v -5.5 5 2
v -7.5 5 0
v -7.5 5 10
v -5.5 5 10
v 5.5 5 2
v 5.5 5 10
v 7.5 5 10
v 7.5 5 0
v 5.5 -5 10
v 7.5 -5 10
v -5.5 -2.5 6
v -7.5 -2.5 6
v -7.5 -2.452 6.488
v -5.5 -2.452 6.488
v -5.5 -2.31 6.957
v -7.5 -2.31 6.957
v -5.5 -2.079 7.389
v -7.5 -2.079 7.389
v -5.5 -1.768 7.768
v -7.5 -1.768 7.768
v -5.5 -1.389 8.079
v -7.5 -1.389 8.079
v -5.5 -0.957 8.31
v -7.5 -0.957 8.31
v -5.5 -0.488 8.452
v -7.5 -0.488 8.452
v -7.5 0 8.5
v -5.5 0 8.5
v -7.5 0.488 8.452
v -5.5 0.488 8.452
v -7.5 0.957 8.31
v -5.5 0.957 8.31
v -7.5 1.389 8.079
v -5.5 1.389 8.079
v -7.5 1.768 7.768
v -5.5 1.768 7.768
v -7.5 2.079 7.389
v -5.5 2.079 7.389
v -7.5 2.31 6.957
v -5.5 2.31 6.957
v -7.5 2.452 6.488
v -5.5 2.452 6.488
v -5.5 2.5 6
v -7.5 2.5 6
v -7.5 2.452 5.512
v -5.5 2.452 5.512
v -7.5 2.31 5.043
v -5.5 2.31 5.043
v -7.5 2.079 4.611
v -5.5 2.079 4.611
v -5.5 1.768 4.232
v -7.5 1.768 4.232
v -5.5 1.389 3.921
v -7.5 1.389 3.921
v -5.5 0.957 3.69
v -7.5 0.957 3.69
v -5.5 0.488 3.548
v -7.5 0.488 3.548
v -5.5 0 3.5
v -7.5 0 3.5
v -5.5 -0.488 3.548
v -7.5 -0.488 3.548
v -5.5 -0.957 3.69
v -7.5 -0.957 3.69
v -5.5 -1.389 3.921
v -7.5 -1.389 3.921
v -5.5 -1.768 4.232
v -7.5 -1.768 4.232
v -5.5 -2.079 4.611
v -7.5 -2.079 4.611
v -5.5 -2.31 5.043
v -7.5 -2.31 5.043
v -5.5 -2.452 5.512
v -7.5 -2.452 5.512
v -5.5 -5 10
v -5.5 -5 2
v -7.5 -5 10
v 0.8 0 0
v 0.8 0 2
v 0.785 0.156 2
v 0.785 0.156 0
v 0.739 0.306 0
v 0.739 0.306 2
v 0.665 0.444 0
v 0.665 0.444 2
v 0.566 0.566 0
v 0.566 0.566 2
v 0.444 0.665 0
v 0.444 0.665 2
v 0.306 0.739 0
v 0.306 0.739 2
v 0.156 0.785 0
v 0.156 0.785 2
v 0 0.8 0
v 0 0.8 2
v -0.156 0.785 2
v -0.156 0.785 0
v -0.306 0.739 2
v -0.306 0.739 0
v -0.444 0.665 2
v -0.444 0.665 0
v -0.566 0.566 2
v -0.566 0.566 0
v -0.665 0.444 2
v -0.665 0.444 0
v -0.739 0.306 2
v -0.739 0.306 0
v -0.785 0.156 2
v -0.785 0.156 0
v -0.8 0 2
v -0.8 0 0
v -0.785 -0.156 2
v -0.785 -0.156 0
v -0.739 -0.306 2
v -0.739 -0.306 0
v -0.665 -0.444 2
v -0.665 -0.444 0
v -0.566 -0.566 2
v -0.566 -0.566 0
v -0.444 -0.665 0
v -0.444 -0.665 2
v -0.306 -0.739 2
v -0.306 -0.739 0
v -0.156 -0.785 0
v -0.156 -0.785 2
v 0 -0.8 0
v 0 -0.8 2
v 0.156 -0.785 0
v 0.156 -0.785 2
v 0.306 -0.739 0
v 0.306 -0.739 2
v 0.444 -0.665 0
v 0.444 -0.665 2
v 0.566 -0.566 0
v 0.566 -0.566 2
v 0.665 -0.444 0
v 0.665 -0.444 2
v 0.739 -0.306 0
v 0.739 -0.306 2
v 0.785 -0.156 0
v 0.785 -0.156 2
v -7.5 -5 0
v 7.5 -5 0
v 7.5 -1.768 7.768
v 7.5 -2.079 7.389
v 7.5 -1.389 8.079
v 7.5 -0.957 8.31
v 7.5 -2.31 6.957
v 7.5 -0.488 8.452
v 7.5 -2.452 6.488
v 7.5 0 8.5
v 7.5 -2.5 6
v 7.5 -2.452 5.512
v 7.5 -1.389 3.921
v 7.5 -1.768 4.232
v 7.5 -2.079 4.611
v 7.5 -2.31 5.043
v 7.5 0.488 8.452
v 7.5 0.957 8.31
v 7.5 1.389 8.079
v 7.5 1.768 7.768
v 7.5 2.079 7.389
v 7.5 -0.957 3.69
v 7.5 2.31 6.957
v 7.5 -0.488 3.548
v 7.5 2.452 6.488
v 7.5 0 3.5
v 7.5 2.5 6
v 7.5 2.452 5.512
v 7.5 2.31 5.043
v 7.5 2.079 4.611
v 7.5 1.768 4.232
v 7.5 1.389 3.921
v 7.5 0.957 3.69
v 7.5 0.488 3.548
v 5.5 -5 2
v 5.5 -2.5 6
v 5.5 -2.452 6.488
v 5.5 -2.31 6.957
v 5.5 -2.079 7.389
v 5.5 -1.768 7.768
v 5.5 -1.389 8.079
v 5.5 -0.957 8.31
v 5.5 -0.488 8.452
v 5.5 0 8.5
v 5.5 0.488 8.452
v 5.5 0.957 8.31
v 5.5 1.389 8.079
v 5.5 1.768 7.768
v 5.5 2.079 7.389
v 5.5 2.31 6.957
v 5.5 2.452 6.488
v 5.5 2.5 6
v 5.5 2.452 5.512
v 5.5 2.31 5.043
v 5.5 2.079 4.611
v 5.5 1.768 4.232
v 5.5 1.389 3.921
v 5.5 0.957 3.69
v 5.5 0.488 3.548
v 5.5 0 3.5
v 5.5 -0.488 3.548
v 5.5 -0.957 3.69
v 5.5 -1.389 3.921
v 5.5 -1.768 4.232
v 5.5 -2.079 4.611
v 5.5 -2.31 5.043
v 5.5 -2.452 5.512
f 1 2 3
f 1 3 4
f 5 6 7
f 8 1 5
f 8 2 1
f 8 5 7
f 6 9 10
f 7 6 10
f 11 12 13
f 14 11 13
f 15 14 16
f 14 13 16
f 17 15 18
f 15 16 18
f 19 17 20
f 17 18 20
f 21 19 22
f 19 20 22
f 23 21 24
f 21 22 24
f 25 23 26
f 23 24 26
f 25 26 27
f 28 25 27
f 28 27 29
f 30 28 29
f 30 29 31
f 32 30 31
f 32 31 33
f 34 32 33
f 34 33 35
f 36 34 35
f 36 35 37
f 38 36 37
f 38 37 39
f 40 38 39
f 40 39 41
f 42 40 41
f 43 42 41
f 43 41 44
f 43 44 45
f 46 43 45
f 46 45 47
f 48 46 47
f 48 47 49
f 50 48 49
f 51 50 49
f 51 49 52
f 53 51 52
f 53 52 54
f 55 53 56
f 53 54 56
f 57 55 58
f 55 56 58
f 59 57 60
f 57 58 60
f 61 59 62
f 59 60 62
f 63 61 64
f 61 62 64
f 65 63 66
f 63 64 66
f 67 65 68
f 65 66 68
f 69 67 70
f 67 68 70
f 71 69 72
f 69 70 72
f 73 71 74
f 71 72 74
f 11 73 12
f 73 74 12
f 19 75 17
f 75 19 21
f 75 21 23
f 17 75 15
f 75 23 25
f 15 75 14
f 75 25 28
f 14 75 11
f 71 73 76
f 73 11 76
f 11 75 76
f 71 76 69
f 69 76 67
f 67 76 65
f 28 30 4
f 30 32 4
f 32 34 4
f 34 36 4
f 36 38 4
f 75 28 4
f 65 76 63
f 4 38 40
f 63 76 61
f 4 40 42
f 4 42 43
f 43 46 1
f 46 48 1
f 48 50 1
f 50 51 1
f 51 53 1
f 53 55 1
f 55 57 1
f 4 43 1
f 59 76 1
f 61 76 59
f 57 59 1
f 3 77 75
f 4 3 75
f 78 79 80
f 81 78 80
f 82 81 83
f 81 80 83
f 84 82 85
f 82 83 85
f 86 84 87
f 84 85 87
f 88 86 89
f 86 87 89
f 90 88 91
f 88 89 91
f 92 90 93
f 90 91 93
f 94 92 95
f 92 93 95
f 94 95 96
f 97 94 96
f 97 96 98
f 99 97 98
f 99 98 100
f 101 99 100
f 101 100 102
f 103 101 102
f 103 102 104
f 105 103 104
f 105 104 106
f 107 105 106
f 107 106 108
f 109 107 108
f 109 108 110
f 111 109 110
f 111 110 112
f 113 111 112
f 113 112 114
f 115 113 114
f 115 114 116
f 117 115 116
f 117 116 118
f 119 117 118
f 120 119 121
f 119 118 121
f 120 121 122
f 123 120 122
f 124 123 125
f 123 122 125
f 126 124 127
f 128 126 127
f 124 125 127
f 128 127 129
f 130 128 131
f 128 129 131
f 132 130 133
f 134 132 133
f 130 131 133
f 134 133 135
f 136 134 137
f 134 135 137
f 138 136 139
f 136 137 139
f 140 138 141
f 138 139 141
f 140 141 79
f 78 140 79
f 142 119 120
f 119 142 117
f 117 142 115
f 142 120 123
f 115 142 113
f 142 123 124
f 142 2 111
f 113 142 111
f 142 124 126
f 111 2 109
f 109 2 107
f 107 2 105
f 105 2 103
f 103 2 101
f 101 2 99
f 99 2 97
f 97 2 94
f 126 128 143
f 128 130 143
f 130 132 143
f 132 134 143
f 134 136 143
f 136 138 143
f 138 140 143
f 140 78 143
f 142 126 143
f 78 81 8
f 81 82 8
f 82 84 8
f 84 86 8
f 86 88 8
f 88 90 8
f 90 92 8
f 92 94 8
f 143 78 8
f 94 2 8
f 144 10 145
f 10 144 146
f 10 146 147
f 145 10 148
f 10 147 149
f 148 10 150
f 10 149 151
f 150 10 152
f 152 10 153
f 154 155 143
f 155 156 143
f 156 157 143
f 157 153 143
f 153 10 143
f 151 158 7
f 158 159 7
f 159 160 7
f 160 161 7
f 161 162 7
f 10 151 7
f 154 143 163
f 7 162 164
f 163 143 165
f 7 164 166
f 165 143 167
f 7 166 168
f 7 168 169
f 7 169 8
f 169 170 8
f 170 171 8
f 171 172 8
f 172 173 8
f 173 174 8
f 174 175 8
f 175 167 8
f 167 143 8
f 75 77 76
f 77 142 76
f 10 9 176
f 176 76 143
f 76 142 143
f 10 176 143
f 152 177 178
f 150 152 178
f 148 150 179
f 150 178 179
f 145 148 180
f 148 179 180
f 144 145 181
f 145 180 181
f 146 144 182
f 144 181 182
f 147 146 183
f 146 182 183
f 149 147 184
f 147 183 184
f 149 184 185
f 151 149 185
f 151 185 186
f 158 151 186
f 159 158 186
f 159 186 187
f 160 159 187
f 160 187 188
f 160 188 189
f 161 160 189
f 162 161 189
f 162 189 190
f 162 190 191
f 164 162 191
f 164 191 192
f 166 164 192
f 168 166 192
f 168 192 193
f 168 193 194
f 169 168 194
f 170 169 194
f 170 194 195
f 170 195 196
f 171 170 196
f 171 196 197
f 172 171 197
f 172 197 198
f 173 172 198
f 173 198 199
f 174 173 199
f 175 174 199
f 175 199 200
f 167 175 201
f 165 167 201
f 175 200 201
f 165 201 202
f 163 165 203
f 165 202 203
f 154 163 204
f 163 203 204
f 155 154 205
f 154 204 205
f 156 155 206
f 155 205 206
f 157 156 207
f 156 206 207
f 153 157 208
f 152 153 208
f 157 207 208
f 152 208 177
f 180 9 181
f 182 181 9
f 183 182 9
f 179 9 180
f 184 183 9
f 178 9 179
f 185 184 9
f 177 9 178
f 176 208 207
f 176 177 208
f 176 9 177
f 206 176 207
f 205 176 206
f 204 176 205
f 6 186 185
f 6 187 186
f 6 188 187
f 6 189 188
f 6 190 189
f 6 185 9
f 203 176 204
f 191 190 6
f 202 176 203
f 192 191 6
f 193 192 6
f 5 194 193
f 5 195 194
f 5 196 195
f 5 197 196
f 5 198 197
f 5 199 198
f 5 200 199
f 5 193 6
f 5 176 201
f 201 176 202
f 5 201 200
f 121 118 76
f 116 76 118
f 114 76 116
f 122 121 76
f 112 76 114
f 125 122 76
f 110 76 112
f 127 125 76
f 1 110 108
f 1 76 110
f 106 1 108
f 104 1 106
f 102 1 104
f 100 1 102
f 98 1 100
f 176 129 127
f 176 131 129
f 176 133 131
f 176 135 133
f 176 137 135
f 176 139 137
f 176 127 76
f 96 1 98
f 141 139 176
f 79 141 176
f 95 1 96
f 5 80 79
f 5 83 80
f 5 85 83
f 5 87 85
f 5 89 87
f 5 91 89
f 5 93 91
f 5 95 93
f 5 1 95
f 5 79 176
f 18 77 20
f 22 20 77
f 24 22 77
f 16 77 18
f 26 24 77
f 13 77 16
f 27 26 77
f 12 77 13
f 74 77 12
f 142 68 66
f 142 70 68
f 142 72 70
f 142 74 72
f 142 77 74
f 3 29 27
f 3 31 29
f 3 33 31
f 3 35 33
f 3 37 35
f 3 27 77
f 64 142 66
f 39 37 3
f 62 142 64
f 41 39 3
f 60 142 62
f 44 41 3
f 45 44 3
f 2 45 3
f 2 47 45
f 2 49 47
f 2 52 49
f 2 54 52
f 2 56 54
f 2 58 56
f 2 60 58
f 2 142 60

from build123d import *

# Parameters (mm, degrees)
SKETCH1_W           = 15
SKETCH1_H           = 10
BOSS_EXTRUDE1_DEPTH = 2
SKETCH2_W           = 2
SKETCH2_H           = 10
BOSS_EXTRUDE2_DEPTH = 8
SKETCH3_R           = 2.5
CUT_EXTRUDE1_DEPTH  = 19.708286934
SKETCH4_R           = 0.8
CUT_EXTRUDE2_DEPTH  = 13.051970793


with BuildPart() as part:
    # Sketch1 → Boss-Extrude1 (new body)
    with BuildSketch(Plane.XY):
        Rectangle(SKETCH1_W, SKETCH1_H)
    extrude(amount=BOSS_EXTRUDE1_DEPTH)

    # Sketch2 → Boss-Extrude2 (add)
    with BuildSketch(Plane.XY.offset(2)):
        with Locations((-6.5, 0)):
            Rectangle(SKETCH2_W, SKETCH2_H)
        with Locations((6.5, 0)):
            Rectangle(SKETCH2_W, SKETCH2_H)
    extrude(amount=BOSS_EXTRUDE2_DEPTH)

    # Sketch3 → Cut-Extrude1 (cut, through all)
    with BuildSketch(Plane.ZY.offset(7.5)):
        with Locations(Location((6, 0, 0), (0, 0, 270))):
            Circle(SKETCH3_R)
    extrude(amount=-CUT_EXTRUDE1_DEPTH, mode=Mode.SUBTRACT)

    # Sketch4 → Cut-Extrude2 (cut, through all)
    with BuildSketch(Plane.XY.offset(2)):
        Circle(SKETCH4_R)
    extrude(amount=-CUT_EXTRUDE2_DEPTH, mode=Mode.SUBTRACT)


solid = part.part
